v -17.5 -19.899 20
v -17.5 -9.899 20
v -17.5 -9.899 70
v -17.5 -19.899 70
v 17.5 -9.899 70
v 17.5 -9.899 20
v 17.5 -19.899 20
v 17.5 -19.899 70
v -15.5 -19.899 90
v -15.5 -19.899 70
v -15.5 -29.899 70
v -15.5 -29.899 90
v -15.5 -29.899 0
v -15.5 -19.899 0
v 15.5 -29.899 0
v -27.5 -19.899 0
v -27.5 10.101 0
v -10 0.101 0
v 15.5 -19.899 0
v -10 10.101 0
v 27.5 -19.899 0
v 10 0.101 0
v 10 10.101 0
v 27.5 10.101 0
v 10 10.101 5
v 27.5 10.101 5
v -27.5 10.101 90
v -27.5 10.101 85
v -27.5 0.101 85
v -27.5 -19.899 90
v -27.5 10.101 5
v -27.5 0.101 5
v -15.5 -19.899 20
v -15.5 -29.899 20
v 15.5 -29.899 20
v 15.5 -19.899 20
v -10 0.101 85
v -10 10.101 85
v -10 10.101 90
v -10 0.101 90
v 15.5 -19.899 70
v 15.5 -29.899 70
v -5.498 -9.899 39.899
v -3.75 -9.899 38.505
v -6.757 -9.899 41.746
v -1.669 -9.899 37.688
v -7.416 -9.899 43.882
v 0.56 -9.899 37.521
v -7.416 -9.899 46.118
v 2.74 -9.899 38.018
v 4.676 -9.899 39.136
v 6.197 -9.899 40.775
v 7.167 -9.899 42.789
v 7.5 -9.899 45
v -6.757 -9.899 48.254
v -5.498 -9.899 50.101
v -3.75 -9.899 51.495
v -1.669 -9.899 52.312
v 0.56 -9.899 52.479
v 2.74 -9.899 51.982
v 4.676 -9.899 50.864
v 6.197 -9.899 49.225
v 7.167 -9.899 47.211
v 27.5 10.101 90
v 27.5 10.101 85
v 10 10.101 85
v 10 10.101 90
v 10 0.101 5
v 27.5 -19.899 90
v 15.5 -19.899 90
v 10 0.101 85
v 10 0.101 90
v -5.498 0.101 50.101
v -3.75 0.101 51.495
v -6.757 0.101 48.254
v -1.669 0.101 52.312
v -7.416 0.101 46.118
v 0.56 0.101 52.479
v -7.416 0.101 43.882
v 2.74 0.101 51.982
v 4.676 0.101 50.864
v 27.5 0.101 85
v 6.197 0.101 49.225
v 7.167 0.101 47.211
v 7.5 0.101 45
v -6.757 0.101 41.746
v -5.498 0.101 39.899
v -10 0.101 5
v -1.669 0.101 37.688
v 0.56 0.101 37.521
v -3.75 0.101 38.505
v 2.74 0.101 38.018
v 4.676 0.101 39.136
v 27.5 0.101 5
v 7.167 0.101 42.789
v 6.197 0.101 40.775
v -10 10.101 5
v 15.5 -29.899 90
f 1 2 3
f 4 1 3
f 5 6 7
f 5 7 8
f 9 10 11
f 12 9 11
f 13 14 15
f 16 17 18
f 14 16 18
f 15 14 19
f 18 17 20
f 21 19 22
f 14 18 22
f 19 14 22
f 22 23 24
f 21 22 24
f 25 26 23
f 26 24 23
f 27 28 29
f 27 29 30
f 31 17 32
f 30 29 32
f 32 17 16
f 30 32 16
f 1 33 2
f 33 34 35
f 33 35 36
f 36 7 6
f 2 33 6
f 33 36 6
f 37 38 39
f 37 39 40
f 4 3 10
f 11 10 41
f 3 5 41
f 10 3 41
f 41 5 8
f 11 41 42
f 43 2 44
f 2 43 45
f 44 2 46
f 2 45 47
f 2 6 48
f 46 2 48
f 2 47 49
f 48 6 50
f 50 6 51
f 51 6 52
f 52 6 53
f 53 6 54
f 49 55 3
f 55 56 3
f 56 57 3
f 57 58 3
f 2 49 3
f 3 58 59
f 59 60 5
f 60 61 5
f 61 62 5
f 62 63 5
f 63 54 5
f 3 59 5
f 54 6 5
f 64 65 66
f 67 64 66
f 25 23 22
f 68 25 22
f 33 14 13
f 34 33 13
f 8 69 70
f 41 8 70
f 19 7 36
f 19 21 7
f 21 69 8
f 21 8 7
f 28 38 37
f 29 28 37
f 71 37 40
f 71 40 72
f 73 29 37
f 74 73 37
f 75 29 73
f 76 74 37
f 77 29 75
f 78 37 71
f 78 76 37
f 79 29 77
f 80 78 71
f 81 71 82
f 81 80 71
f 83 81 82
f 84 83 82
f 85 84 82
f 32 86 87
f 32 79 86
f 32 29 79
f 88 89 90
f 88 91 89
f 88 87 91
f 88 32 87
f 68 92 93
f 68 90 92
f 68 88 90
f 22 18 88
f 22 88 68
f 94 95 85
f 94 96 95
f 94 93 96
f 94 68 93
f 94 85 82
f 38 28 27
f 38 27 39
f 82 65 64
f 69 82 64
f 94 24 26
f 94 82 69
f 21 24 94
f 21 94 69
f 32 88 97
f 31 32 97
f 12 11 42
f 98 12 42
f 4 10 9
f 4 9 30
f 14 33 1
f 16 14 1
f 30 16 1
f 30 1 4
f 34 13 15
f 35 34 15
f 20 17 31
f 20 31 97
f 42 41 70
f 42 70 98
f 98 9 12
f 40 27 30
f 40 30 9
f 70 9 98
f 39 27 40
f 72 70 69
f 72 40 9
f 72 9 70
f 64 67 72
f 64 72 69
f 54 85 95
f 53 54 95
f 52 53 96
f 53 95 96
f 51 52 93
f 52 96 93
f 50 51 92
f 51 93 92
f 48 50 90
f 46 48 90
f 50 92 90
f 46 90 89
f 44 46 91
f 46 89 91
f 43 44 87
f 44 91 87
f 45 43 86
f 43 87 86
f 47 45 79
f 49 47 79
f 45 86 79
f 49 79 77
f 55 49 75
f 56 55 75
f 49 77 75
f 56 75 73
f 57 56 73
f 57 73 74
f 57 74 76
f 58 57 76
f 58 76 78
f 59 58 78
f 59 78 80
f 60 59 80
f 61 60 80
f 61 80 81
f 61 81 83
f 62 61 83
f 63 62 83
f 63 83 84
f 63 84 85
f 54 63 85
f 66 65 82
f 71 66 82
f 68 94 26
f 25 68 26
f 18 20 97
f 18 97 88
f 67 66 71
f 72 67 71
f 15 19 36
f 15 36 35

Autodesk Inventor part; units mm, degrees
ref_plane "YZ Plane" through (0, 0, 0) normal (1, 0, 0) x (0, 1, 0)
ref_plane "XZ Plane" through (0, 0, 0) normal (0, 1, 0) x (-1, 0, 0)
ref_plane "XY Plane" through (0, 0, 0) normal (0, 0, 1) x (1, 0, 0)
sketch "Szkic1" plane through (0, 0, 0) normal (0, 0, 1) x (1, 0, 0)
  line L0 (-27.5, 10.1009) -> (-10, 10.1009)
  line L1 (-10, 10.1009) -> (-10, 0.1009)
  line L2 (-10, 0.1009) -> (10, 0.1009)
  line L3 (-27.5, 10.1009) -> (-27.5, -19.8991)
  line L4 (-27.5, -19.8991) -> (-15.5, -19.8991)
  line L5 (-15.5, -19.8991) -> (-15.5, -29.8991)
  line L6 (-15.5, -29.8991) -> (15.5, -29.8991)
  line L7 (27.5, 10.1009) -> (10, 10.1009)
  line L8 (10, 10.1009) -> (10, 0.1009)
  line L9 (27.5, 10.1009) -> (27.5, -19.8991)
  line L10 (27.5, -19.8991) -> (15.5, -19.8991)
  line L11 (15.5, -19.8991) -> (15.5, -29.8991)
  point P0 (0, 0)
  dimension "d1" = 55
  dimension "d2" = 17.5
  dimension "d3" = 20
  dimension "d4" = 12
  dimension "d5" = 12
  dimension "d6" = 10
  dimension "d14" = 40
  dimension "d15" = 40
  dimension "d16" = 10
  dimension "d17" = 10
extrude "Wyciągnięcie proste1" add sketch "Szkic1" along normal blind 90
sketch "Szkic3" plane through (-27.5, -19.8991, 0) normal (-1, 0, 0) x (0, 0, 1)
  line L0 (5, 30) -> (85, 30)
  line L1 (85, 30) -> (85, 20)
  line L2 (85, 20) -> (5, 20)
  line L3 (5, 20) -> (5, 30)
  line L4 (0, 30) -> (0, 0) projected
  line L5 (0, 30) -> (90, 30) projected
  point P0 (0, 19.8991)
  dimension "d19" = 5
  dimension "d20" = 10
extrude "Wyciągnięcie proste3" cut sketch "Szkic3" against normal through all
sketch "Szkic4" plane through (-15.5, -29.8991, 0) normal (-1, 0, 0) x (0, 0, 1)
  line L0 (20, 0) -> (70, 0)
  line L1 (70, 0) -> (70, 10)
  line L2 (70, 10) -> (20, 10)
  line L3 (20, 10) -> (20, 0)
  line L4 (0, 10) -> (0, 0) projected
  point P0 (0, 29.8991)
  dimension "d23" = 20
  dimension "d24" = 50
extrude "Wyciągnięcie proste4" cut sketch "Szkic4" against normal through all
sketch "Szkic5" plane through (-10, 0.1009, 0) normal (0, 1, 0) x (1, 0, 0)
  line L0 (0, -85) -> (0, -90) construction
  line L1 (20, -90) -> (0, -90) construction
  line L2 (20, -85) -> (20, -90) construction
  line L3 (20, -85) -> (37.5, -85) construction
  line L4 (37.5, -5) -> (37.5, -85) construction
  line L5 (20, -5) -> (37.5, -5) construction
  line L6 (20, 0) -> (20, -5) construction
  line L7 (20, 0) -> (0, 0) construction
  line L8 (0, 0) -> (0, -5) construction
  line L9 (-17.5, -5) -> (0, -5) construction
  line L10 (-17.5, -85) -> (-17.5, -5) construction
  line L11 (-17.5, -85) -> (0, -85) construction
  circle A0 centre (10, -45) radius 7.5
  point P0 (10, 0)
  dimension "d27" = 15
extrude "Wyciągnięcie proste5" cut sketch "Szkic5" against normal through all
ref_plane "Płaszczyzna konstrukcyjna1" through (0, -19.8991, 0) normal (-1, 0, 0) x (0, 0, 1)
sketch "Szkic6" plane through (0, -19.8991, 0) normal (-1, 0, 0) x (0, 0, 1)
  line L0 (85, 30) -> (85, 20) projected
  line L1 (85, 20) -> (5, 20) projected
  line L2 (5, 20) -> (5, 30) projected
  line L3 (0, 30) -> (5, 30) projected
  line L4 (0, 30) -> (0, 0) projected
  line L5 (0, 0) -> (90, 0) projected
  line L6 (90, 30) -> (90, 0) projected
  line L7 (85, 30) -> (90, 30) projected
  line L8 (70, 0) -> (20, 0)
  line L9 (20, 0) -> (20, 10)
  line L10 (20, 10) -> (70, 10)
  line L11 (70, 10) -> (70, 0)
  point P0 (0, 19.8991)
extrude "Wyciągnięcie proste6" cut sketch "Szkic6" along normal mid plane 35 contours L5 L9 L10 L11
properties part number "Bartosz_Zukowski_model_nr_5_1"
